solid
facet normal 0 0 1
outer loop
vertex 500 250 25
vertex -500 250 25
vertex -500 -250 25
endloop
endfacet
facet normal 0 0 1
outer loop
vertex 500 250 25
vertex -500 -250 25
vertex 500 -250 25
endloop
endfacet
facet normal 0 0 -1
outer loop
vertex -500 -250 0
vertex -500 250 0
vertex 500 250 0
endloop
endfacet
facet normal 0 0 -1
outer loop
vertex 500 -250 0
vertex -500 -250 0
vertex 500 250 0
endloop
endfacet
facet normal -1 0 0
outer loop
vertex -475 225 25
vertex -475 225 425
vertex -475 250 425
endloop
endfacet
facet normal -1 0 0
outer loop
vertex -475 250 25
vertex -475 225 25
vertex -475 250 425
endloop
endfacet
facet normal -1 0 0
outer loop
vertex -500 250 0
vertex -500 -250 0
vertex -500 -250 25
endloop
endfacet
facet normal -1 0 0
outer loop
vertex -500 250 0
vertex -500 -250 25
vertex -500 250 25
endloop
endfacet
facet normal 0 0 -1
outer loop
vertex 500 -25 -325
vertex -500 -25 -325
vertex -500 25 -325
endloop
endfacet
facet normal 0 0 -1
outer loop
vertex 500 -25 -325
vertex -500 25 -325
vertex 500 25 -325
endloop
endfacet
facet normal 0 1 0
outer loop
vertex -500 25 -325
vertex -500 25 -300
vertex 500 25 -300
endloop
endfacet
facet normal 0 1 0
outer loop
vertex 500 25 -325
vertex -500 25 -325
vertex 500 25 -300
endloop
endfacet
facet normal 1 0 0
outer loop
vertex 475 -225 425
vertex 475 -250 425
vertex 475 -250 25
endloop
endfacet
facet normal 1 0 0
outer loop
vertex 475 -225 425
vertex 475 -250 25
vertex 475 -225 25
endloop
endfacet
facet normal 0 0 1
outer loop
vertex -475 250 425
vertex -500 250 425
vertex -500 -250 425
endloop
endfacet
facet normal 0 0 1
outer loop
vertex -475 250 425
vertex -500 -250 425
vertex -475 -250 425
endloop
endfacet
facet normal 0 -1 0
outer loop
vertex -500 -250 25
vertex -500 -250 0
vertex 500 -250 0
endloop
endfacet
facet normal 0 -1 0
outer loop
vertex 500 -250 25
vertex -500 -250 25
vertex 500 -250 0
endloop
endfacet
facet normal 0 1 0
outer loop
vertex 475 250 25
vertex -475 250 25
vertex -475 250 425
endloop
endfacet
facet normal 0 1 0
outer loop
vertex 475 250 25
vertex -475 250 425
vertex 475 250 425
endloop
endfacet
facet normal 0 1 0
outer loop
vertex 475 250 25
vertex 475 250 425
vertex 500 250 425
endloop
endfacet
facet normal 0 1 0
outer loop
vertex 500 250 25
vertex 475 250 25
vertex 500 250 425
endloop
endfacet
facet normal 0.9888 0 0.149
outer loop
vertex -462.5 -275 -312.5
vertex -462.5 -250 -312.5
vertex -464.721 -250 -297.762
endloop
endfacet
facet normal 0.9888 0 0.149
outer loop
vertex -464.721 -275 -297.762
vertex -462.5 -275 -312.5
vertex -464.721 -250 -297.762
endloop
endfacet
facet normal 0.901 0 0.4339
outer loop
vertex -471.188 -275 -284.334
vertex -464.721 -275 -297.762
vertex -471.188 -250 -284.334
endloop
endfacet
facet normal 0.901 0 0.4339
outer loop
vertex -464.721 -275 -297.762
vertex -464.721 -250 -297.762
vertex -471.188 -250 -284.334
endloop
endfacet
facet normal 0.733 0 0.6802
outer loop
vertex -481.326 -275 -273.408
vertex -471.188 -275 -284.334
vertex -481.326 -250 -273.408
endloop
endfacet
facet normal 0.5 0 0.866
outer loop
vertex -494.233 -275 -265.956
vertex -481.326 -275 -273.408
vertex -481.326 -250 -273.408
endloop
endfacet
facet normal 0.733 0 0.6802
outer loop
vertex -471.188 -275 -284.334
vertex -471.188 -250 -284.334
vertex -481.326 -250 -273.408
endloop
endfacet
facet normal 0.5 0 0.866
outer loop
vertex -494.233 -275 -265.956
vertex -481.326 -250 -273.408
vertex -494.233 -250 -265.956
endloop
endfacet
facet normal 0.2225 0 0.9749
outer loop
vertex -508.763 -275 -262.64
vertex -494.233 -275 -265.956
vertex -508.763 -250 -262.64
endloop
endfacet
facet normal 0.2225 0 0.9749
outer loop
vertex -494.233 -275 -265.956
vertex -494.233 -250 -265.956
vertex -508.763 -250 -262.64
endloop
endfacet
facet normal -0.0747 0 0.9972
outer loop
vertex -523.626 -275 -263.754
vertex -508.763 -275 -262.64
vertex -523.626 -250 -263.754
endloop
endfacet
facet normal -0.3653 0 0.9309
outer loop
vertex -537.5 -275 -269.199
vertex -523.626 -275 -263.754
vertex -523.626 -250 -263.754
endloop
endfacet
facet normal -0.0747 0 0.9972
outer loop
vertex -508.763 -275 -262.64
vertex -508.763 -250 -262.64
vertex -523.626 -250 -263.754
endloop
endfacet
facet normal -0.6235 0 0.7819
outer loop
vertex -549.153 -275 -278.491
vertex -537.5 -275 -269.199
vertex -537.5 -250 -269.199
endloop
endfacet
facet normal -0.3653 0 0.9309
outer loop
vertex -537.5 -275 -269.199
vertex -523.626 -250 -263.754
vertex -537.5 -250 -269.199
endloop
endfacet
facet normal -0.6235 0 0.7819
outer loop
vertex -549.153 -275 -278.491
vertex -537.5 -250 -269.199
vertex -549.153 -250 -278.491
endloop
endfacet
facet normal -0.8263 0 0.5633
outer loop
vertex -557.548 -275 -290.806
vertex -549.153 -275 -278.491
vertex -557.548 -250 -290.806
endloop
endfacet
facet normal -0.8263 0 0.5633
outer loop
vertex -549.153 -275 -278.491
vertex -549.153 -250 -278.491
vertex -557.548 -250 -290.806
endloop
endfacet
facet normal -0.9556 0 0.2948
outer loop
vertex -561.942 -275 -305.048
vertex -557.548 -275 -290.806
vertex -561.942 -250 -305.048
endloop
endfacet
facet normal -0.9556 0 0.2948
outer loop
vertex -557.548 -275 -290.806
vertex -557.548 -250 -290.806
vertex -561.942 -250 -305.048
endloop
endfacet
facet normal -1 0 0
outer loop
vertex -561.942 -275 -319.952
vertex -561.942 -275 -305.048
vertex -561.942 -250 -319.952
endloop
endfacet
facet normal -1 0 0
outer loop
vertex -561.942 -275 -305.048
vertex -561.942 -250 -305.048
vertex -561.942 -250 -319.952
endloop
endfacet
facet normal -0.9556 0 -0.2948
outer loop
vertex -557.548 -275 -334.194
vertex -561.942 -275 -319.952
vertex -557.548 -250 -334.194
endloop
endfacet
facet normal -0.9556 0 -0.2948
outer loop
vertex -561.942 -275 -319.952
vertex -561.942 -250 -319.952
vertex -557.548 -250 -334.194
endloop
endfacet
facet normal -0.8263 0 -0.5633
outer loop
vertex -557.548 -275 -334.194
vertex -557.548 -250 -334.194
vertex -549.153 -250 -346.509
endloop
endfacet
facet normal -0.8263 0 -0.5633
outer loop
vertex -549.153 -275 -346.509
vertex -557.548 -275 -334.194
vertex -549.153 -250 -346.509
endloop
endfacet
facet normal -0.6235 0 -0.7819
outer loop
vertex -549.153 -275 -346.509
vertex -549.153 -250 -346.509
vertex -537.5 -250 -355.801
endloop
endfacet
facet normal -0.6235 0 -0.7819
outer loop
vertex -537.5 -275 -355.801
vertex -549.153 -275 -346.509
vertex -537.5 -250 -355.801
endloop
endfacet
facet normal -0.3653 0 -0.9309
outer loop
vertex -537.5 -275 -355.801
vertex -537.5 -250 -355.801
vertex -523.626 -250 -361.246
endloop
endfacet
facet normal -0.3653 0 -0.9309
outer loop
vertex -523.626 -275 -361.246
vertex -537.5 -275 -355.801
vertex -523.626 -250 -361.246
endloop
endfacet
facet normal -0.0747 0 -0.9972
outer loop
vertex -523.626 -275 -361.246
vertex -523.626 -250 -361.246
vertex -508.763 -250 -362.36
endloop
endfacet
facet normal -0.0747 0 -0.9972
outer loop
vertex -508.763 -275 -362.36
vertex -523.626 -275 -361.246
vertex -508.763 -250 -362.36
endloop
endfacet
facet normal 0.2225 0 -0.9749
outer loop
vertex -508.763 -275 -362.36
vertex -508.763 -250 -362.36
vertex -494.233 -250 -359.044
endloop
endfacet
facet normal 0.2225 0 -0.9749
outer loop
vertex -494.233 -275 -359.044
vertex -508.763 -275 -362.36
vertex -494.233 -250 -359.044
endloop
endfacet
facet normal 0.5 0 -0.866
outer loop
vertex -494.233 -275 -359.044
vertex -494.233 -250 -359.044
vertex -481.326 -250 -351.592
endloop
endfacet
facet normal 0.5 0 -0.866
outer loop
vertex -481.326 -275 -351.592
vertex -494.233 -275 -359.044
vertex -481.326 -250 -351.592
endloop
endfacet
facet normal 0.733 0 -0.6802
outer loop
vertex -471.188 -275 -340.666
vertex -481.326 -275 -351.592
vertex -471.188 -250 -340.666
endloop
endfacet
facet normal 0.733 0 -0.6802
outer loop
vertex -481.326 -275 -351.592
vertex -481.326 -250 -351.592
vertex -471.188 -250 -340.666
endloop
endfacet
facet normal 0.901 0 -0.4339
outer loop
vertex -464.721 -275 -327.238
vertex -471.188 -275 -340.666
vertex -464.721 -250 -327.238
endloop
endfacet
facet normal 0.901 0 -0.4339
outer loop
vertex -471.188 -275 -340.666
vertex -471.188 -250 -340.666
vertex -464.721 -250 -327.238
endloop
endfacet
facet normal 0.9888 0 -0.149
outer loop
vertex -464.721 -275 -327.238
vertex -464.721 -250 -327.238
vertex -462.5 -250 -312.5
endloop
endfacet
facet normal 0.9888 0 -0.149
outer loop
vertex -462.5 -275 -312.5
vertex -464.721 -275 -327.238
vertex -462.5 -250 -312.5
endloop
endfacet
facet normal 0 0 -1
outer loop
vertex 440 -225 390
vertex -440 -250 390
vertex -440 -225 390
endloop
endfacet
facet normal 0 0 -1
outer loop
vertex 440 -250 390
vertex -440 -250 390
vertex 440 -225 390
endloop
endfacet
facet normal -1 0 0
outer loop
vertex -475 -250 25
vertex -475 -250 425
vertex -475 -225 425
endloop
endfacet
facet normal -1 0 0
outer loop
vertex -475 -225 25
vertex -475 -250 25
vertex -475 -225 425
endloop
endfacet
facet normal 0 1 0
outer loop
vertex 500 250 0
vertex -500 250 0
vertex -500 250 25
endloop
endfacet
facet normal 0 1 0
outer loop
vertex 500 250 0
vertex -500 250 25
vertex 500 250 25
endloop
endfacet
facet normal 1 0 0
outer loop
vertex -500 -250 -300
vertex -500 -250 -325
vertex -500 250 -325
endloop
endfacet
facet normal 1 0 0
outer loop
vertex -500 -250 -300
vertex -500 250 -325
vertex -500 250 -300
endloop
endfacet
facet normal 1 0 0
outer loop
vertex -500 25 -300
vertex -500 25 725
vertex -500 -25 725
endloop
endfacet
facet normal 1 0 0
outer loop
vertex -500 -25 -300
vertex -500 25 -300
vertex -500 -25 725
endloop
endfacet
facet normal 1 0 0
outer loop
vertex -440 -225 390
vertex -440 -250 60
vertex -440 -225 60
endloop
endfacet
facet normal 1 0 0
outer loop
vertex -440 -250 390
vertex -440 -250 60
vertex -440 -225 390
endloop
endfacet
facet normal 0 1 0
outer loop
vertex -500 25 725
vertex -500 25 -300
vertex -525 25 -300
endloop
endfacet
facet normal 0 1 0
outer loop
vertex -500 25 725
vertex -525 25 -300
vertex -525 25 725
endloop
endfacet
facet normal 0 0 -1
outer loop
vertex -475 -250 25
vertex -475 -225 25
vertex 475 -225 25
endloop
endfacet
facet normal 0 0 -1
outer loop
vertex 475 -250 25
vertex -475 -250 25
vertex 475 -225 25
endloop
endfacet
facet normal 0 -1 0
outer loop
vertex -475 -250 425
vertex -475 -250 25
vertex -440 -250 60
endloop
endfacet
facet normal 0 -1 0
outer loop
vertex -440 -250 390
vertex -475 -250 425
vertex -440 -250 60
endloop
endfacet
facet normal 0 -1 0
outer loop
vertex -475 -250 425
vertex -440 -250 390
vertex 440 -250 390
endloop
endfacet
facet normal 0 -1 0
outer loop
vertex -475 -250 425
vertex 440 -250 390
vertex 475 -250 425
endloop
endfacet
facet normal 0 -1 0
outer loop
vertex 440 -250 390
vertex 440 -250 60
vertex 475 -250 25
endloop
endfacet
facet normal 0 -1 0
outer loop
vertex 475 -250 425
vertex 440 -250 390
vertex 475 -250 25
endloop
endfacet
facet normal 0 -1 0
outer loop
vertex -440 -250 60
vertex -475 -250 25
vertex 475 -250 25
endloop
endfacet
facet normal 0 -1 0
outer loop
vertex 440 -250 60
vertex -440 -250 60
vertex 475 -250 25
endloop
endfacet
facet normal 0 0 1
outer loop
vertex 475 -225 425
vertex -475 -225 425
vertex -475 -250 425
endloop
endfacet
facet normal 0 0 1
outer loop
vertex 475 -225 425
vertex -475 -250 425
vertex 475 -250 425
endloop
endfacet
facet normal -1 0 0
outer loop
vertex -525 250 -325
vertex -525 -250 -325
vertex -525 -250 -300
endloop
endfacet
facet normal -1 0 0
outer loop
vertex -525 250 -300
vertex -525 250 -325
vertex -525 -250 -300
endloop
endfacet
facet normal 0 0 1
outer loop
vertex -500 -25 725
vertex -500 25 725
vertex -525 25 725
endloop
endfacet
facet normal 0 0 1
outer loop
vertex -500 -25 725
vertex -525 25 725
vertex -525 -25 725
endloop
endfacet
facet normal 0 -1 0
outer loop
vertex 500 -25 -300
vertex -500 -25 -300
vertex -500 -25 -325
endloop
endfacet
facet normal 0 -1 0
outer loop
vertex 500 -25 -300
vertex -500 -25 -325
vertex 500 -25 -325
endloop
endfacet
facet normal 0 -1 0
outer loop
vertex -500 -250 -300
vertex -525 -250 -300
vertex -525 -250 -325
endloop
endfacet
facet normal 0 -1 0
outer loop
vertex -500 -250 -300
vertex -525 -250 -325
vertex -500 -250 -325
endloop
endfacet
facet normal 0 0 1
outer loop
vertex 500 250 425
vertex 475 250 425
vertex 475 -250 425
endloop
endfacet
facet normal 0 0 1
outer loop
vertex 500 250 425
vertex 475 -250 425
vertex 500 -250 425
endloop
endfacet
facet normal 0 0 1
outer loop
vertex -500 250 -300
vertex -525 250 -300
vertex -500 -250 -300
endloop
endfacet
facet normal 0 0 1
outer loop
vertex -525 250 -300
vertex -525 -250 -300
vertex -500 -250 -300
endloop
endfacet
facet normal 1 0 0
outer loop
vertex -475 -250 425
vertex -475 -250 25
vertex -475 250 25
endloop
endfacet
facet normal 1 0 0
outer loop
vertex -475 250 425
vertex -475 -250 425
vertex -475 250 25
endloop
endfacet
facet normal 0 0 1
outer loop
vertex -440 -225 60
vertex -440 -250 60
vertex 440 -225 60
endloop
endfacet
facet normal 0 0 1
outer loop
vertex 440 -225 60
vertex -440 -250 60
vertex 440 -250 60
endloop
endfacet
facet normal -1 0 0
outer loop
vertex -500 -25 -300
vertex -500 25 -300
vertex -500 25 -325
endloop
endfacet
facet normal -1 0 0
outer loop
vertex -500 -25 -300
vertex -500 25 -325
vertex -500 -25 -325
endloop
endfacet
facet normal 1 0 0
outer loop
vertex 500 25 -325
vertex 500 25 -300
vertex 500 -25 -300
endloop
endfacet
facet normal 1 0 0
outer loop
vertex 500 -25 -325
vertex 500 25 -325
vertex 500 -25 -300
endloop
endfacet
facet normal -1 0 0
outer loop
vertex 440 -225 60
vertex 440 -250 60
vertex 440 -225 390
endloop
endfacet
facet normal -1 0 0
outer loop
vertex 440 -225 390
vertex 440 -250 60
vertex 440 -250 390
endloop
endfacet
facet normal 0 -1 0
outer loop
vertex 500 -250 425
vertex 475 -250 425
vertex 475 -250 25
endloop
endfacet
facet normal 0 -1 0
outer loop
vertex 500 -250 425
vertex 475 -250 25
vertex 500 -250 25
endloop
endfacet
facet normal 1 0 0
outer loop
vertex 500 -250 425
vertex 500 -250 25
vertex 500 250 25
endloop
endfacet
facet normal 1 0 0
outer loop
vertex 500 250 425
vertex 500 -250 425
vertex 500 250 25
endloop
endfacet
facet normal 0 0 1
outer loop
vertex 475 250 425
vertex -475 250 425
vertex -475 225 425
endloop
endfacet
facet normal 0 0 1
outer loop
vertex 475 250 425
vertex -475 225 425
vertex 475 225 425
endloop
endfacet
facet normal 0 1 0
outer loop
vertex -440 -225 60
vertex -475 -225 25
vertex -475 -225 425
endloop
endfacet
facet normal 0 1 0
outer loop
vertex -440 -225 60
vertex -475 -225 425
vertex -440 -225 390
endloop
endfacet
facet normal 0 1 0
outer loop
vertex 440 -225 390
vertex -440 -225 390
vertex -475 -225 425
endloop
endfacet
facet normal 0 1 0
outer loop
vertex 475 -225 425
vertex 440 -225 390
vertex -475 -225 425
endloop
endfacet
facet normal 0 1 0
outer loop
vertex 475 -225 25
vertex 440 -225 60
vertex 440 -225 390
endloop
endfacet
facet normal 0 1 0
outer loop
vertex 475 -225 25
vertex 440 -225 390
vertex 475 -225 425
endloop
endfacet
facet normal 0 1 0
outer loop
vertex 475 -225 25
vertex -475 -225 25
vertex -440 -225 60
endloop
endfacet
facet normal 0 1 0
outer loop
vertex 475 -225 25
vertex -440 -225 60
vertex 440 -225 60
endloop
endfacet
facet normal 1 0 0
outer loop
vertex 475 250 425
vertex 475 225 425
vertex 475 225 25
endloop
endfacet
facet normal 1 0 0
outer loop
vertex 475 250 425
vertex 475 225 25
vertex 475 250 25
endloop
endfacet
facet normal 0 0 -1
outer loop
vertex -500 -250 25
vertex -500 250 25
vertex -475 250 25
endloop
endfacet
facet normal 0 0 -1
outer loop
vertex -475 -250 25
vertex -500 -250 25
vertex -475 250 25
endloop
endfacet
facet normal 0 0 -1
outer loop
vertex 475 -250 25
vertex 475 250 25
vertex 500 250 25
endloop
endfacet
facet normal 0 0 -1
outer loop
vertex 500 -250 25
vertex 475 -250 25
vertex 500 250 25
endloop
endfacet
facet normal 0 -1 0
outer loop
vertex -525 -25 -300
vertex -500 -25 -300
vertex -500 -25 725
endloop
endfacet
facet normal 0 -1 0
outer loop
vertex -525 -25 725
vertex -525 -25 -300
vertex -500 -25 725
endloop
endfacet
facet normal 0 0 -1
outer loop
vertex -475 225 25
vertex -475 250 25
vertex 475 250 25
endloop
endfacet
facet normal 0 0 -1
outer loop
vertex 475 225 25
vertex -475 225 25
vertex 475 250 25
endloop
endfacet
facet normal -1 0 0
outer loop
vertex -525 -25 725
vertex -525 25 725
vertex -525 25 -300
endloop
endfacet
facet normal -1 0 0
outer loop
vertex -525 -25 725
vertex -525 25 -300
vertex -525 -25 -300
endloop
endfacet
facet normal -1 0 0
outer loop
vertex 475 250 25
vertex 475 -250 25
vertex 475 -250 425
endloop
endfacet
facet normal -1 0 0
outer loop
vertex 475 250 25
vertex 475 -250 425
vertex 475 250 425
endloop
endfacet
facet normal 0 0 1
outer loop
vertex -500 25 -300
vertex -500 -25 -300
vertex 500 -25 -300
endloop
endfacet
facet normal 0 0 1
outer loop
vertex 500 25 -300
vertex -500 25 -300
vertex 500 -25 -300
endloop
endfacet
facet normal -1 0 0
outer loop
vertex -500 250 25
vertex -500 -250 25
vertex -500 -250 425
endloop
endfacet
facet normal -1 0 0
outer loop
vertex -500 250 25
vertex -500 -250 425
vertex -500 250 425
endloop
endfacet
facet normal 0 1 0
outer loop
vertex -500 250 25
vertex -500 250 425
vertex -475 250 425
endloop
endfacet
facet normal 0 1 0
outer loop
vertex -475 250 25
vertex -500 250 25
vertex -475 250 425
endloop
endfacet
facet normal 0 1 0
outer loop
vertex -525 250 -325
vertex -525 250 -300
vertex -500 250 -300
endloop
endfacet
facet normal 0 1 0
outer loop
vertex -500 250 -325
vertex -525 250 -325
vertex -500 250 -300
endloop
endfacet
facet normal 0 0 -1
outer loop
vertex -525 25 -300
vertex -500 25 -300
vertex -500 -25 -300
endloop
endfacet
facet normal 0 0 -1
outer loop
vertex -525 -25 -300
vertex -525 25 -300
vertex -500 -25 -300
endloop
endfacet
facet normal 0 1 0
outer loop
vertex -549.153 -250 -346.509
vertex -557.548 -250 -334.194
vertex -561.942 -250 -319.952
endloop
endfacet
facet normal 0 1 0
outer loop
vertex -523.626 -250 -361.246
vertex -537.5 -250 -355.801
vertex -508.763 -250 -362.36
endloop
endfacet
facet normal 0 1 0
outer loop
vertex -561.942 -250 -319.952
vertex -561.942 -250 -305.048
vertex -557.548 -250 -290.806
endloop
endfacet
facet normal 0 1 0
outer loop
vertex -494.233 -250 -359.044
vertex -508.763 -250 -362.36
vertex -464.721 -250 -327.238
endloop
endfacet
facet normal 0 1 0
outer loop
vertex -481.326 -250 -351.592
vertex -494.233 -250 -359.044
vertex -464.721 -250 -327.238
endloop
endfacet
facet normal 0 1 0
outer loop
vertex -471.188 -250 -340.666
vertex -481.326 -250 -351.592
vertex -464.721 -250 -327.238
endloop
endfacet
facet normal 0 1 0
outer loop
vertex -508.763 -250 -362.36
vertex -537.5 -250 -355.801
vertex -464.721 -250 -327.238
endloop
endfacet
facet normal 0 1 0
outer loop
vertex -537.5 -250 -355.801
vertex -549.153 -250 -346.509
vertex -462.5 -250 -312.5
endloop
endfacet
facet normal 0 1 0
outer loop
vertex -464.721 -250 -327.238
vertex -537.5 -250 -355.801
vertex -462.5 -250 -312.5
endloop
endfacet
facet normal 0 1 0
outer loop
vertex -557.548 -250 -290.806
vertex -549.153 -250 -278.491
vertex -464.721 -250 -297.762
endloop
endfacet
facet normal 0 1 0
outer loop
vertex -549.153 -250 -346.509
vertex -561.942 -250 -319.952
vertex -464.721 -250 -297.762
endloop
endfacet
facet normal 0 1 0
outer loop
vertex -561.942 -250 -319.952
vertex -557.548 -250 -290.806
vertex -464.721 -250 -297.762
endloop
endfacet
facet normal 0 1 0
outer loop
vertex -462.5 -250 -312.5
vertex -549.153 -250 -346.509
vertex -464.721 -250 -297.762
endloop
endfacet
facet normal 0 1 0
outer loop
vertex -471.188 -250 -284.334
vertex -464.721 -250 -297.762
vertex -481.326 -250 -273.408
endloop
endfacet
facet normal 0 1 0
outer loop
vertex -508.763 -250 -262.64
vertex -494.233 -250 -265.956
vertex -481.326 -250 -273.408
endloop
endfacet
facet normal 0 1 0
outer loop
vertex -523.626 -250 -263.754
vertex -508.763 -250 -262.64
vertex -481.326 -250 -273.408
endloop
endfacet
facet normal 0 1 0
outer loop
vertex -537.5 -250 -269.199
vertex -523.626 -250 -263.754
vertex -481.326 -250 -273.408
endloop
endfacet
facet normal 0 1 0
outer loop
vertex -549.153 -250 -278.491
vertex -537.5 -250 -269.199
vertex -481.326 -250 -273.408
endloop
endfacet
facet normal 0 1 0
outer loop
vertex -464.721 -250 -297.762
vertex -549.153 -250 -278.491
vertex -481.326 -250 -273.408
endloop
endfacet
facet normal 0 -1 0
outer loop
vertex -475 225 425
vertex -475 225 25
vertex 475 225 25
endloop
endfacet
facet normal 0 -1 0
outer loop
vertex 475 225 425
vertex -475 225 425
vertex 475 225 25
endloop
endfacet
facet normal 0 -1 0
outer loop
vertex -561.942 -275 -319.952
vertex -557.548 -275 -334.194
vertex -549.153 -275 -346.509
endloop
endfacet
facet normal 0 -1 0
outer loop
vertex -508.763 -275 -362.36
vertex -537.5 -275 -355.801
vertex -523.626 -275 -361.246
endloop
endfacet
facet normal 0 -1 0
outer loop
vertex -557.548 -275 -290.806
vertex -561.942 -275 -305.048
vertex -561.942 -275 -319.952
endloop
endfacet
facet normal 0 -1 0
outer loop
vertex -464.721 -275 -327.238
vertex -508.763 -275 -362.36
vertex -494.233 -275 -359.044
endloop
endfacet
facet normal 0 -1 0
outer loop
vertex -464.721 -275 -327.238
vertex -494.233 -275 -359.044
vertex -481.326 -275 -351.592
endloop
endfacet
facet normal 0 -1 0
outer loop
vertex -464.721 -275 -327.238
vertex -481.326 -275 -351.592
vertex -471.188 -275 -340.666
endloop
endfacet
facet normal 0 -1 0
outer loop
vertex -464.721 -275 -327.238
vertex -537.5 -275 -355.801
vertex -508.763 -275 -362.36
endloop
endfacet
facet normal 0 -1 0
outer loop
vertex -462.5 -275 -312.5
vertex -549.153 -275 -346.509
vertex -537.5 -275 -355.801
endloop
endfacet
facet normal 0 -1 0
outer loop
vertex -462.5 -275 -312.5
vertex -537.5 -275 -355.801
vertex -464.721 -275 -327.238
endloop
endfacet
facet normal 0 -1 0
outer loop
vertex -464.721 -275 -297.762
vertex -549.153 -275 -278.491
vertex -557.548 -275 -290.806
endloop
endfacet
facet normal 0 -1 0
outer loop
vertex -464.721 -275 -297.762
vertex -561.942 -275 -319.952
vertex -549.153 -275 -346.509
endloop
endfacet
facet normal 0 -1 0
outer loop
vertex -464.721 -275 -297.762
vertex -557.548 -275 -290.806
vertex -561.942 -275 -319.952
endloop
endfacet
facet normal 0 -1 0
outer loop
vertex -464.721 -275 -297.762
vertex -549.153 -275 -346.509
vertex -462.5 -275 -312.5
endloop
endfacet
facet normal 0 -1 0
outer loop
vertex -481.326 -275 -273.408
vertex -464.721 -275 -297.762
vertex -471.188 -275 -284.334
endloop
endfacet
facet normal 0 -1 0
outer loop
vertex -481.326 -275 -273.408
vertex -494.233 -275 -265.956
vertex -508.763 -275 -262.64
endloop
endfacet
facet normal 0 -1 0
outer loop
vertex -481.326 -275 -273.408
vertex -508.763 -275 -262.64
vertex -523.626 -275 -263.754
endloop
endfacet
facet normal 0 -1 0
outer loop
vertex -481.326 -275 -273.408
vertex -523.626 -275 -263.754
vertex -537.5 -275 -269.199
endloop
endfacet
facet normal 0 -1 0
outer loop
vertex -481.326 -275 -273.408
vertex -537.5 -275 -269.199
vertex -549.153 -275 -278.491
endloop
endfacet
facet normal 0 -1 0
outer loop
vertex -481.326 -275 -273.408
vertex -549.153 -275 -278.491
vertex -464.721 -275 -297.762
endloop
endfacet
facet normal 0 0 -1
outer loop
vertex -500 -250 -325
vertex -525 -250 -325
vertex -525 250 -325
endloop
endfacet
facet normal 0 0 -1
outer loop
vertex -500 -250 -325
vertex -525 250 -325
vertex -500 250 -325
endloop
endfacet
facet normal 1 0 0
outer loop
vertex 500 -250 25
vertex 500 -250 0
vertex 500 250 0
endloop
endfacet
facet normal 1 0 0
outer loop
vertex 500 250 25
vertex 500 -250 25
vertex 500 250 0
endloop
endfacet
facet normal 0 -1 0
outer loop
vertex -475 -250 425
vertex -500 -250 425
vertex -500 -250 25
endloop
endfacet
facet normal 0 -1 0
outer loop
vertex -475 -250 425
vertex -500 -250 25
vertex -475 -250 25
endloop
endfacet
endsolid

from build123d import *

# Parameters (mm, degrees)
F0_W           = 1000
F0_H           = 500
F1_DEPTH       = 25
F2_W           = 25
F2_H           = 500
F3_DEPTH       = 400
F4_W           = 25
F4_H           = 500
F5_DEPTH       = 400
F6_W           = 950
F6_H           = 25
F7_DEPTH       = 400
F8_W           = 950
F8_H           = 25
F9_DEPTH       = 400
F10_W          = 50
F10_H          = 1025
F11_DEPTH      = 25
F12_W          = 50
F12_H          = 1025
F13_DEPTH      = 25
F14_W          = 1000
F14_H          = 50
F15_DEPTH      = 25
F16_W          = 25
F16_H          = 25
F17_DEPTH      = 250
F17_DEPTH_BACK = 250
F18_R          = 50
F19_DEPTH      = 25
F21_W          = 880
F21_H          = 330
F22_DEPTH      = 500.001


# Not quite as in the source:
# - the program builds the solid bodies; features that only make, move or delete a surface that nothing else refers to are left out


with BuildPart() as f1:
    # F0 (on Top) → F1 (new body)
    with BuildSketch(Plane.XY):
        Rectangle(F0_W, F0_H)
    extrude(amount=F1_DEPTH)


with BuildPart() as f3:
    # F2 (on face) → F3 (new body)
    with BuildSketch(Plane.XY.offset(25)):
        with Locations((-487.5, 0)):
            Rectangle(F2_W, F2_H)
    extrude(amount=F3_DEPTH)


with BuildPart() as f5:
    # F4 (on face) → F5 (new body, through all)
    with BuildSketch(Plane.XY.offset(25)):
        with Locations((487.5, 0)):
            Rectangle(F4_W, F4_H)
    extrude(amount=F5_DEPTH)


with BuildPart() as f7:
    # F6 (on face) → F7 (new body, through all)
    with BuildSketch(Plane.XY.offset(25)):
        with Locations((0, 237.5)):
            Rectangle(F6_W, F6_H)
    extrude(amount=F7_DEPTH)


with BuildPart() as f9:
    # F8 (on face) → F9 (new body, through all)
    with BuildSketch(Plane.XY.offset(25)):
        with Locations((0, -237.5)):
            Rectangle(F8_W, F8_H)
    extrude(amount=F9_DEPTH)

    # F21 (on face) → F22 (cut, through all)
    with BuildSketch(Plane.XZ.offset(250)):
        with Locations((0, 225)):
            Rectangle(F21_W, F21_H)
    extrude(amount=-F22_DEPTH, mode=Mode.SUBTRACT)


with BuildPart() as f11:
    # F10 (on face) → F11 (new body)
    with BuildSketch(Plane.YZ.offset(500)):
        with Locations((0, 212.5)):
            Rectangle(F10_W, F10_H)
    extrude(amount=F11_DEPTH)


with BuildPart() as f13:
    # F12 (on face) → F13 (new body)
    with BuildSketch(Plane(origin=(-500, 0, 0), x_dir=(0, -1, 0), z_dir=(-1, 0, 0))):
        with Locations((0, 212.5)):
            Rectangle(F12_W, F12_H)
    extrude(amount=F13_DEPTH)


with BuildPart() as f15:
    # F14 (on face) → F15 (new body)
    with BuildSketch(Plane(origin=(0, 0, -300), x_dir=(1, 0, 0), z_dir=(0, 0, -1))):
        Rectangle(F14_W, F14_H)
    extrude(amount=F15_DEPTH)


with BuildPart() as f17:
    # F16 (on Front) → F17 (new body, two sides)
    with BuildSketch(Plane.XZ) as f17_sk:
        with Locations((-512.5, -312.5)):
            Rectangle(F16_W, F16_H)
    extrude(amount=F17_DEPTH)
    extrude(f17_sk.sketch, amount=-F17_DEPTH_BACK)


with BuildPart() as f19:
    # F18 (on face) → F19 (new body)
    with BuildSketch(Plane.XZ.offset(250)):
        with Locations((-512.5, -312.5)):
            Circle(F18_R)
    extrude(amount=F19_DEPTH)


solid = Compound([f1.part, f3.part, f5.part, f7.part, f9.part, f13.part, f15.part, f17.part, f19.part])
